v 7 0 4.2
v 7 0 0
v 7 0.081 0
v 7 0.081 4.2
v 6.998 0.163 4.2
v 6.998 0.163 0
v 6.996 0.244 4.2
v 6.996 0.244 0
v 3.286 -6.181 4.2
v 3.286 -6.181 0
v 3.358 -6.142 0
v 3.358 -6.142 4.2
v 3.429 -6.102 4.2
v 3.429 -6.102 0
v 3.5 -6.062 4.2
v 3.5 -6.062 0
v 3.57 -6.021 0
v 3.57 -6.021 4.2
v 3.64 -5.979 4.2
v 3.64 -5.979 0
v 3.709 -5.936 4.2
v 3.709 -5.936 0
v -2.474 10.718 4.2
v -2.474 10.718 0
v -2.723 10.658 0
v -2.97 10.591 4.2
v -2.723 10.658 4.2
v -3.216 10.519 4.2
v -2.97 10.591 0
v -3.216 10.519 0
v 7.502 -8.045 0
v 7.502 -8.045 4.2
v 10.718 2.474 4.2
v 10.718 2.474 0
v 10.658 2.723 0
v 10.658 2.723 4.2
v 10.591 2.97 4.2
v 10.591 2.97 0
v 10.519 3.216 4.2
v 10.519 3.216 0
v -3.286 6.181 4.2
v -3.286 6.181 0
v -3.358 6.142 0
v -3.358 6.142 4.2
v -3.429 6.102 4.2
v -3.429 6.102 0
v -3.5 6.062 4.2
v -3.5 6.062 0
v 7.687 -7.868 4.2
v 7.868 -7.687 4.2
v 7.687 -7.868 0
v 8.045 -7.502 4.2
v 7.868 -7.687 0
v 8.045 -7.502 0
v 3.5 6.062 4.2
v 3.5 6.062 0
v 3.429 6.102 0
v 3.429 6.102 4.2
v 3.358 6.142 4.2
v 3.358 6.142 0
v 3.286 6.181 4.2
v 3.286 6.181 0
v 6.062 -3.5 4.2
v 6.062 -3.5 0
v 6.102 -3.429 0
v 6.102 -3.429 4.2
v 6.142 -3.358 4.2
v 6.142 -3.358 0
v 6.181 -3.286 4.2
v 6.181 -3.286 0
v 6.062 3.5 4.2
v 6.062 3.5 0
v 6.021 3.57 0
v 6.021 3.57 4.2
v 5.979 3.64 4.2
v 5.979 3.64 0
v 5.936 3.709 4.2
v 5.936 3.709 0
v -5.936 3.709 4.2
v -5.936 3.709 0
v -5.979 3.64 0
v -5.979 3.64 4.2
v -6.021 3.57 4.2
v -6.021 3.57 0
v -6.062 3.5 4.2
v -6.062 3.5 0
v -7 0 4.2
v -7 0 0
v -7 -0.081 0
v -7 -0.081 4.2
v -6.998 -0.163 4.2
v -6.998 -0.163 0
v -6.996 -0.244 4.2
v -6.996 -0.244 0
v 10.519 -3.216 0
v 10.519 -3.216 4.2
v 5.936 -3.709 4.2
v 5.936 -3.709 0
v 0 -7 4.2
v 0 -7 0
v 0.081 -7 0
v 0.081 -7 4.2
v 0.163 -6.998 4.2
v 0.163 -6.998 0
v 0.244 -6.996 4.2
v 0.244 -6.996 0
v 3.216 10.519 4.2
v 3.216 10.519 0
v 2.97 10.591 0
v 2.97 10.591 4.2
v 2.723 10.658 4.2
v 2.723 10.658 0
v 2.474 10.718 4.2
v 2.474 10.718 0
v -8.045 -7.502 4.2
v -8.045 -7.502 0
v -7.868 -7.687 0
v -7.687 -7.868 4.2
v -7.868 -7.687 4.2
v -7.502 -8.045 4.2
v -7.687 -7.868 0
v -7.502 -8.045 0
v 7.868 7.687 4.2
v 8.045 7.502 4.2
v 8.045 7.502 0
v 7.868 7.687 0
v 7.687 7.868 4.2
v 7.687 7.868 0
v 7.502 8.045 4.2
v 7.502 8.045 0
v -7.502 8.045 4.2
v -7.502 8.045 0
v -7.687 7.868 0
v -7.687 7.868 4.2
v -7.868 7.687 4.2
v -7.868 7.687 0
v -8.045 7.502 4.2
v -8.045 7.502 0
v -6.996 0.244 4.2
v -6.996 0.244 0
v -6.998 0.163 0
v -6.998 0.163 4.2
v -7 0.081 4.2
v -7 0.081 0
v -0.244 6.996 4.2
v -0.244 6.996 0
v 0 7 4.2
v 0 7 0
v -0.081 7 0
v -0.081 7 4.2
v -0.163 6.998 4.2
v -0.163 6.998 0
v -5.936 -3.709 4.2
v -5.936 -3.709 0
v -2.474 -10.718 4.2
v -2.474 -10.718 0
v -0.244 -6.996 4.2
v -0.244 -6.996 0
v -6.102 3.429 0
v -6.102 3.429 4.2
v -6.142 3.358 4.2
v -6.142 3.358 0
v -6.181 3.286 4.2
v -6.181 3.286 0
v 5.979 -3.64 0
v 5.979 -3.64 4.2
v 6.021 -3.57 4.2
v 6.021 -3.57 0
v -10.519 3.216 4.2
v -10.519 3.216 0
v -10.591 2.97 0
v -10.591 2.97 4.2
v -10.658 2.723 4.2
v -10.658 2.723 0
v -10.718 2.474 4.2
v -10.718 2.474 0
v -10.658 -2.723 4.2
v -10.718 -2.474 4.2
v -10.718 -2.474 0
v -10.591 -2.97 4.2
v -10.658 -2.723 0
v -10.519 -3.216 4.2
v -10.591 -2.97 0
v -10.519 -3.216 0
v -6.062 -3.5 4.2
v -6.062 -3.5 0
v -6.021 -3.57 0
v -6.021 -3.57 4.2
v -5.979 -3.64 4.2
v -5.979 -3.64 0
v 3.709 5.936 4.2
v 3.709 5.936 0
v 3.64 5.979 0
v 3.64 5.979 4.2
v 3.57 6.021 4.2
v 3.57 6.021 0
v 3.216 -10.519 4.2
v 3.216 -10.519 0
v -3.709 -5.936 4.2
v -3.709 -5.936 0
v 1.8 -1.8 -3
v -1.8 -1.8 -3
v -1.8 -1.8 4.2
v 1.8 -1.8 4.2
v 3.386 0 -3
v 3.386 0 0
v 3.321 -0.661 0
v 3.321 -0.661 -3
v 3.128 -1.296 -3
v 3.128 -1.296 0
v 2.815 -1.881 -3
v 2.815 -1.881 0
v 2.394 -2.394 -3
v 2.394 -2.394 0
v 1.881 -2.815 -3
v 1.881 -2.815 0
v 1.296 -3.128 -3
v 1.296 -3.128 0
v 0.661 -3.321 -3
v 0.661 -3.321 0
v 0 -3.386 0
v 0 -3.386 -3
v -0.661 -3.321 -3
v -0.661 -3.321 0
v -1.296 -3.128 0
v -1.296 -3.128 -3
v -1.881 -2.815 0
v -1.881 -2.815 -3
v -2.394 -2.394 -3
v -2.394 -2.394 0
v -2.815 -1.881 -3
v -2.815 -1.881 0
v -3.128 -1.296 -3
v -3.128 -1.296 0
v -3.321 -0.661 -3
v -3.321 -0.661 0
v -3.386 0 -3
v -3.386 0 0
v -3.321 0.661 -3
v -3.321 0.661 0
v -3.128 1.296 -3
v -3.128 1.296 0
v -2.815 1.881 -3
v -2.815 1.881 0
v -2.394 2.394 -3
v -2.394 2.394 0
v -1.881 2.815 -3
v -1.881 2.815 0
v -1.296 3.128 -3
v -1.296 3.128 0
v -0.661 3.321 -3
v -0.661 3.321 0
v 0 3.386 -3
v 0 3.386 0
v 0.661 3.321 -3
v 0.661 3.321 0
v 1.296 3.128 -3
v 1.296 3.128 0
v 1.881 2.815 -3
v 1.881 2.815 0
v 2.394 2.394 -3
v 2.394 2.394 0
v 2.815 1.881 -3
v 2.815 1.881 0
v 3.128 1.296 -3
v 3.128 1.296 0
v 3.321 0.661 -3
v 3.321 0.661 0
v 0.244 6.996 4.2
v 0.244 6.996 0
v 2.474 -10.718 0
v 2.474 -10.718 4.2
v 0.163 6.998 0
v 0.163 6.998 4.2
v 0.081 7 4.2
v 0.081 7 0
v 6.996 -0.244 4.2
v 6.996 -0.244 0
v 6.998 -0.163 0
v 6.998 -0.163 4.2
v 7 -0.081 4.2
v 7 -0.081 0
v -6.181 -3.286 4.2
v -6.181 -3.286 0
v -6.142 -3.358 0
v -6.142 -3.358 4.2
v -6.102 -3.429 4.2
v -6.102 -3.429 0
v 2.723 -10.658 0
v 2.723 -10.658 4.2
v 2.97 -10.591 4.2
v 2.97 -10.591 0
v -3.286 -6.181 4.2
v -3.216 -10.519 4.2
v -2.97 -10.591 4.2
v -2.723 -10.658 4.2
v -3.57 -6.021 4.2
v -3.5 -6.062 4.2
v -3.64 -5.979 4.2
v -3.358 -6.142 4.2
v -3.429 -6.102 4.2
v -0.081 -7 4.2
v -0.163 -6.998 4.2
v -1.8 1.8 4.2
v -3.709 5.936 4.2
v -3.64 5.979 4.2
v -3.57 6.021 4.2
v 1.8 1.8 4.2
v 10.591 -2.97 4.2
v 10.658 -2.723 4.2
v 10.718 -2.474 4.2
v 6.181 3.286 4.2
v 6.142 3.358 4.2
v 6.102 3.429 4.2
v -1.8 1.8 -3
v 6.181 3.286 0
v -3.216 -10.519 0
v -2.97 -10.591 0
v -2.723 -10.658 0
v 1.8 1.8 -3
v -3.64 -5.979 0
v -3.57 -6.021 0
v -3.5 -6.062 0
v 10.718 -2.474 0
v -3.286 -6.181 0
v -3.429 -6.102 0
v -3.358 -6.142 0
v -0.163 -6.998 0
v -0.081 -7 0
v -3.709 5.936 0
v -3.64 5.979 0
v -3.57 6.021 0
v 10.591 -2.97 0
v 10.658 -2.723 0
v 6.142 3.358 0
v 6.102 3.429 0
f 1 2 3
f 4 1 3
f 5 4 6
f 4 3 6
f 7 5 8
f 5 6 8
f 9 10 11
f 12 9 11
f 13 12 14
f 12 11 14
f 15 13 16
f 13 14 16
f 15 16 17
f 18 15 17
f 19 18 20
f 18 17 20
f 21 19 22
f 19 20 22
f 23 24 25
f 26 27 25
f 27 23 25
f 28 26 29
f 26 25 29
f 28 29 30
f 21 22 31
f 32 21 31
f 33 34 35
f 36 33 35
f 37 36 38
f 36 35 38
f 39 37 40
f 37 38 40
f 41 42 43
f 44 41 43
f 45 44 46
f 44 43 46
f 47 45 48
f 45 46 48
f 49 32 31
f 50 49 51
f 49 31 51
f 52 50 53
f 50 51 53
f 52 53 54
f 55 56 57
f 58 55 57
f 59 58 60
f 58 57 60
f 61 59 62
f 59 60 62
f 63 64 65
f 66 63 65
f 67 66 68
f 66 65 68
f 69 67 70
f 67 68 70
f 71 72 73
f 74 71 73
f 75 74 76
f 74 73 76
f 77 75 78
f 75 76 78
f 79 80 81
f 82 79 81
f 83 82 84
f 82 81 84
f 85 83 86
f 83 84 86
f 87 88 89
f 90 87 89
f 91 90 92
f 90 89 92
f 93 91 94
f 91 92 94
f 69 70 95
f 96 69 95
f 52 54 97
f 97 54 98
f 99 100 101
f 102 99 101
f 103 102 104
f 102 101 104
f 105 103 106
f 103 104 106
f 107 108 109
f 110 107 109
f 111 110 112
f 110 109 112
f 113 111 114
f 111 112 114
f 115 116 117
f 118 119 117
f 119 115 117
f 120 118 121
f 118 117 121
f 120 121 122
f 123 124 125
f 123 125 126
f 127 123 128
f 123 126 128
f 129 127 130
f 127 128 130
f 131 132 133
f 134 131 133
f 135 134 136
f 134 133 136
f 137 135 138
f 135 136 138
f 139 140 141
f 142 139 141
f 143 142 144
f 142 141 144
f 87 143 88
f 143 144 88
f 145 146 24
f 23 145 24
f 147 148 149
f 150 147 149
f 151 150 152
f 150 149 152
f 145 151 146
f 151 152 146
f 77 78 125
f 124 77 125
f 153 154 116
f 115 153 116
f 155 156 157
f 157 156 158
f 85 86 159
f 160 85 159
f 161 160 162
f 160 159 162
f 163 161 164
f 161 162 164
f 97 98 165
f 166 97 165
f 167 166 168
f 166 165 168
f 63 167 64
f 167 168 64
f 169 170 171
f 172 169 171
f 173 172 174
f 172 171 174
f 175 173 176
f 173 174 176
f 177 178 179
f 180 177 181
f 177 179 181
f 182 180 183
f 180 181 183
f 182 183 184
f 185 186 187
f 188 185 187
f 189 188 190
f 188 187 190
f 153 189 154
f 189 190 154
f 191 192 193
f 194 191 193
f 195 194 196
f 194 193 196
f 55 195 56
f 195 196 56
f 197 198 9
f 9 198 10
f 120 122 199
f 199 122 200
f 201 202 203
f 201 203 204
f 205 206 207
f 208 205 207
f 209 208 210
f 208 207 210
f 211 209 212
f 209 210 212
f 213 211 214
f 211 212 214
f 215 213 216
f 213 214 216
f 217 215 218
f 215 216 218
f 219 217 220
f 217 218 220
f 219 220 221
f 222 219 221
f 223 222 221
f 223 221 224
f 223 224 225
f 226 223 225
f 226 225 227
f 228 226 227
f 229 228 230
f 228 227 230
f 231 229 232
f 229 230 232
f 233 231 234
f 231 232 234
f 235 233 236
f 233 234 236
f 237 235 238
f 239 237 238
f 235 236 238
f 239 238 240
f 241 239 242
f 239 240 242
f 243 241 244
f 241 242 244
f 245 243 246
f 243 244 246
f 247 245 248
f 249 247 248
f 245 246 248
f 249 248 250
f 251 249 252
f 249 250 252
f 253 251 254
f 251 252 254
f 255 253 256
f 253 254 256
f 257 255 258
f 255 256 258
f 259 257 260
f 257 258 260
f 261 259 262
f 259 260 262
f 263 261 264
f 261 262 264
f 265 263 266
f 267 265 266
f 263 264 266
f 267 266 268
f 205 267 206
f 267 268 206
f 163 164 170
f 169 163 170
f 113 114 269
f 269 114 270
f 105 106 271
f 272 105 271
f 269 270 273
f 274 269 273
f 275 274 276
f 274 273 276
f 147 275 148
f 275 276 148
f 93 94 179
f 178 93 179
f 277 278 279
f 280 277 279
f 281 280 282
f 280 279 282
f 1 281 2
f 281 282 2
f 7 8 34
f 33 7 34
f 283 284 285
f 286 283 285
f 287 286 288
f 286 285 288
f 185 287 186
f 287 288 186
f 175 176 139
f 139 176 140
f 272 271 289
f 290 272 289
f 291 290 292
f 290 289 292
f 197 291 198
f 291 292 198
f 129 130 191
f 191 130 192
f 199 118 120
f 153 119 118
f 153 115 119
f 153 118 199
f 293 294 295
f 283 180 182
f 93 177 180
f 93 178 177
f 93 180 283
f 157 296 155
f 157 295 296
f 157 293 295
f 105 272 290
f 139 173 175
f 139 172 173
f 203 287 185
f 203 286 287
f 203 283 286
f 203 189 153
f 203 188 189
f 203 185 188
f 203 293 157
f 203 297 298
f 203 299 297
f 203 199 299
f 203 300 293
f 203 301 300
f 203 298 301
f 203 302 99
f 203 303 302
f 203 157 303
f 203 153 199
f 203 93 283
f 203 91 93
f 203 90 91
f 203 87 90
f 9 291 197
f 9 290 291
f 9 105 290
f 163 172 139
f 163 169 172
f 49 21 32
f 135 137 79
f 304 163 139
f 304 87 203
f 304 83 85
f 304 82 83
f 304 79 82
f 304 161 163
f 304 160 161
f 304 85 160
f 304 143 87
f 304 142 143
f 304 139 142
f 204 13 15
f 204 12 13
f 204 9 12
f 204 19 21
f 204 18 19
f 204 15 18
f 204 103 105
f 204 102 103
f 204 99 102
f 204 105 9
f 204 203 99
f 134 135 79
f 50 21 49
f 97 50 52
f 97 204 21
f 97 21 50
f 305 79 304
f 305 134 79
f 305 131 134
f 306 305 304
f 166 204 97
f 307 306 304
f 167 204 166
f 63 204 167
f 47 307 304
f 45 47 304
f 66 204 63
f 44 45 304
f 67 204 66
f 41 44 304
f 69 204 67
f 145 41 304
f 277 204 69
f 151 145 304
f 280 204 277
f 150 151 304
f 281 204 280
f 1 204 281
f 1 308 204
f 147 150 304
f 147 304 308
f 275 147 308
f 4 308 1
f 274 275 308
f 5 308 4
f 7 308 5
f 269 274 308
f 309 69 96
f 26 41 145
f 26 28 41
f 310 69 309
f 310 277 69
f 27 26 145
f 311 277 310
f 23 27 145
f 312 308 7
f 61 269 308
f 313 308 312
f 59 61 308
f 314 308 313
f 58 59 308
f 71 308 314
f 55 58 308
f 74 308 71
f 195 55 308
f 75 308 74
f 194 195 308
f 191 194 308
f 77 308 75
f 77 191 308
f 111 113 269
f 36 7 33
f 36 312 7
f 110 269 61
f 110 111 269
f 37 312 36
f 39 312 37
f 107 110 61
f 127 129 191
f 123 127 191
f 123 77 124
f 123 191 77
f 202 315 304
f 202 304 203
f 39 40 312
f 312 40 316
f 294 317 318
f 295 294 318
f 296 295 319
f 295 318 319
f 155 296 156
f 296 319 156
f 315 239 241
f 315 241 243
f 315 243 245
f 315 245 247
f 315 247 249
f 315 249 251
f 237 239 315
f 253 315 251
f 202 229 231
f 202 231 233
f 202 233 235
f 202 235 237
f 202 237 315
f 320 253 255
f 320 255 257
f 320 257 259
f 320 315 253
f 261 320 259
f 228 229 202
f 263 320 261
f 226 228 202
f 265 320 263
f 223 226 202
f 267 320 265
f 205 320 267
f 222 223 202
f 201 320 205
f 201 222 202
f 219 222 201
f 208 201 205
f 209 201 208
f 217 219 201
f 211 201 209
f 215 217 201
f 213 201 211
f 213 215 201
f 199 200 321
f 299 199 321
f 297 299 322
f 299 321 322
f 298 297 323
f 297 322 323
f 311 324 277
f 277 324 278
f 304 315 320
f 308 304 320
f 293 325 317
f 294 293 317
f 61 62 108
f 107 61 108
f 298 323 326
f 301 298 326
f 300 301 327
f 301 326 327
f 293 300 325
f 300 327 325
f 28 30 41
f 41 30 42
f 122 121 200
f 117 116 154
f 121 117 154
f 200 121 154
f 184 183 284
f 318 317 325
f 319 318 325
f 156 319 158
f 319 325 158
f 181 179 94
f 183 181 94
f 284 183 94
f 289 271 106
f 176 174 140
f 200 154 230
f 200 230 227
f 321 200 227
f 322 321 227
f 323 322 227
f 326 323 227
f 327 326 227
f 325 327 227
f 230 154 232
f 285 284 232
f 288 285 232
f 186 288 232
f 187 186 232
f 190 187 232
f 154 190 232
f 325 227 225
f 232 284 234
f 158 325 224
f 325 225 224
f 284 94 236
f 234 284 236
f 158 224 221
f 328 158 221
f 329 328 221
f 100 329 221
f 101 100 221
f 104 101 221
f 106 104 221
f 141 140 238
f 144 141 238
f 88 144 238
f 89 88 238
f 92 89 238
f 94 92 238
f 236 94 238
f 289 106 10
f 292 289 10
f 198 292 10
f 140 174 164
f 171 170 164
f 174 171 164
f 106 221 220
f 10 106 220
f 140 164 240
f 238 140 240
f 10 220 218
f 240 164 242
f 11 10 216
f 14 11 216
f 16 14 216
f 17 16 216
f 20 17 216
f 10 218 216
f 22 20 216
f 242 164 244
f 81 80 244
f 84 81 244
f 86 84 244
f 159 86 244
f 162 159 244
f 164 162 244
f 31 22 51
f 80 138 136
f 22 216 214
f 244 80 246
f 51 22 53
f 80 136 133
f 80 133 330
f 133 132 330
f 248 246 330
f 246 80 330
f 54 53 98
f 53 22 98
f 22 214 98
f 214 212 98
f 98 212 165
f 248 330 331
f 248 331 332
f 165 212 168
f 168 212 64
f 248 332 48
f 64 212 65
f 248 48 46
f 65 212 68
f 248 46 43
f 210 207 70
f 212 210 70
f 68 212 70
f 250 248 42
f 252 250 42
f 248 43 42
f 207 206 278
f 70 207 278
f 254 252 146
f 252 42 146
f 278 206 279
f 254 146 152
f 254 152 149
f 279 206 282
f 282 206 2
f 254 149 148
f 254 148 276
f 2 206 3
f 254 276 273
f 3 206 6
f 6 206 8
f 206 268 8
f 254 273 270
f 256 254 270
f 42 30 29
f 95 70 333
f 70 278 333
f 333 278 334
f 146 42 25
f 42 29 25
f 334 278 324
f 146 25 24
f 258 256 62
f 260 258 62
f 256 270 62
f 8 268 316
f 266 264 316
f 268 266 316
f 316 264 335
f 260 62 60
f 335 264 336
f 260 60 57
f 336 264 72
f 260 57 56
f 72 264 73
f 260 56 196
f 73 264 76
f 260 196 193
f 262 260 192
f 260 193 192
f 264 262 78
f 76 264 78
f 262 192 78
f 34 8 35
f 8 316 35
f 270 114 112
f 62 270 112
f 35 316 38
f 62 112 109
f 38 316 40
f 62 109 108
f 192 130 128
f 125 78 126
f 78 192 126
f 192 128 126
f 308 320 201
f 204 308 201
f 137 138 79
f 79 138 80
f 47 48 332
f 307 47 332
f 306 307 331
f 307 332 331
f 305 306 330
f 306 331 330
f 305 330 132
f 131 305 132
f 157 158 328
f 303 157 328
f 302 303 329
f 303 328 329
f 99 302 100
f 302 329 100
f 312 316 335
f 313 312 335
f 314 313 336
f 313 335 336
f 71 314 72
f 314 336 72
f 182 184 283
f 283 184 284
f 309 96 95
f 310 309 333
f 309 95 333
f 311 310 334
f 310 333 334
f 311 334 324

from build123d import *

# Parameters (mm, degrees)
F0_R            = 11
F1_DEPTH        = 4.2
F3_DEPTH        = 4.201
F3_COPIES_COUNT = 12
F5_R            = 3.3858769499
F6_DEPTH        = 3
F7_W            = 3.6
F7_H            = 3.6
F8_DEPTH        = 7.201


# Not quite as in the source:
# - a pattern or mirror of a feature is missing from the dataset's text; its kind, count and spacing are read off the source's solid


with BuildPart() as f1:
    # F0 (on Top) → F1 (new body)
    with BuildSketch(Plane.XY):
        Circle(F0_R)
    extrude(amount=F1_DEPTH)

    # F2 (on face) → F3 (cut, through all)
    with BuildSketch(Plane(origin=(0, 0, 0), x_dir=(1, 0, 0), z_dir=(0, 0, -1))):
        with BuildLine():
            ThreePointArc((-0.2442964769, 6.9957357891), (-0.1221668451, 6.9989338661), (0, 7))
            Line((0, 7), (0, 11))
            ThreePointArc((0, 11), (-1.2452353514, 10.9292904124), (-2.4744615978, 10.7180707126))
            Line((-2.4744615978, 10.7180707126), (-0.2442964769, 6.9957357891))
        make_face()
        with BuildLine():
            Line((0, 11), (0, 7))
            ThreePointArc((0, 7), (0.1221668451, 6.9989338661), (0.2442964769, 6.9957357891))
            Line((0.2442964769, 6.9957357891), (2.4744615978, 10.7180707126))
            ThreePointArc((2.4744615978, 10.7180707126), (1.2452353514, 10.9292904124), (0, 11))
        make_face()
    f3 = extrude(amount=-F3_DEPTH, mode=Mode.SUBTRACT)

    # F3_copies: F3 ×12 about axis
    f3_copies_axis = Axis((0, 0, 0), (0, 0, 1))
    for i in range(1, F3_COPIES_COUNT):
        add(f3.rotate(f3_copies_axis, i * 360 / F3_COPIES_COUNT), mode=Mode.SUBTRACT)

    # F5 (on face) → F6 (join)
    with BuildSketch(Plane(origin=(0, 0, 0), x_dir=(1, 0, 0), z_dir=(0, 0, -1))):
        Circle(F5_R)
    extrude(amount=F6_DEPTH)

    # F7 (on face) → F8 (cut, through all)
    with BuildSketch(Plane(origin=(0, 0, -3), x_dir=(1, 0, 0), z_dir=(0, 0, -1))):
        Rectangle(F7_W, F7_H)
    extrude(amount=-F8_DEPTH, mode=Mode.SUBTRACT)


solid = f1.part
